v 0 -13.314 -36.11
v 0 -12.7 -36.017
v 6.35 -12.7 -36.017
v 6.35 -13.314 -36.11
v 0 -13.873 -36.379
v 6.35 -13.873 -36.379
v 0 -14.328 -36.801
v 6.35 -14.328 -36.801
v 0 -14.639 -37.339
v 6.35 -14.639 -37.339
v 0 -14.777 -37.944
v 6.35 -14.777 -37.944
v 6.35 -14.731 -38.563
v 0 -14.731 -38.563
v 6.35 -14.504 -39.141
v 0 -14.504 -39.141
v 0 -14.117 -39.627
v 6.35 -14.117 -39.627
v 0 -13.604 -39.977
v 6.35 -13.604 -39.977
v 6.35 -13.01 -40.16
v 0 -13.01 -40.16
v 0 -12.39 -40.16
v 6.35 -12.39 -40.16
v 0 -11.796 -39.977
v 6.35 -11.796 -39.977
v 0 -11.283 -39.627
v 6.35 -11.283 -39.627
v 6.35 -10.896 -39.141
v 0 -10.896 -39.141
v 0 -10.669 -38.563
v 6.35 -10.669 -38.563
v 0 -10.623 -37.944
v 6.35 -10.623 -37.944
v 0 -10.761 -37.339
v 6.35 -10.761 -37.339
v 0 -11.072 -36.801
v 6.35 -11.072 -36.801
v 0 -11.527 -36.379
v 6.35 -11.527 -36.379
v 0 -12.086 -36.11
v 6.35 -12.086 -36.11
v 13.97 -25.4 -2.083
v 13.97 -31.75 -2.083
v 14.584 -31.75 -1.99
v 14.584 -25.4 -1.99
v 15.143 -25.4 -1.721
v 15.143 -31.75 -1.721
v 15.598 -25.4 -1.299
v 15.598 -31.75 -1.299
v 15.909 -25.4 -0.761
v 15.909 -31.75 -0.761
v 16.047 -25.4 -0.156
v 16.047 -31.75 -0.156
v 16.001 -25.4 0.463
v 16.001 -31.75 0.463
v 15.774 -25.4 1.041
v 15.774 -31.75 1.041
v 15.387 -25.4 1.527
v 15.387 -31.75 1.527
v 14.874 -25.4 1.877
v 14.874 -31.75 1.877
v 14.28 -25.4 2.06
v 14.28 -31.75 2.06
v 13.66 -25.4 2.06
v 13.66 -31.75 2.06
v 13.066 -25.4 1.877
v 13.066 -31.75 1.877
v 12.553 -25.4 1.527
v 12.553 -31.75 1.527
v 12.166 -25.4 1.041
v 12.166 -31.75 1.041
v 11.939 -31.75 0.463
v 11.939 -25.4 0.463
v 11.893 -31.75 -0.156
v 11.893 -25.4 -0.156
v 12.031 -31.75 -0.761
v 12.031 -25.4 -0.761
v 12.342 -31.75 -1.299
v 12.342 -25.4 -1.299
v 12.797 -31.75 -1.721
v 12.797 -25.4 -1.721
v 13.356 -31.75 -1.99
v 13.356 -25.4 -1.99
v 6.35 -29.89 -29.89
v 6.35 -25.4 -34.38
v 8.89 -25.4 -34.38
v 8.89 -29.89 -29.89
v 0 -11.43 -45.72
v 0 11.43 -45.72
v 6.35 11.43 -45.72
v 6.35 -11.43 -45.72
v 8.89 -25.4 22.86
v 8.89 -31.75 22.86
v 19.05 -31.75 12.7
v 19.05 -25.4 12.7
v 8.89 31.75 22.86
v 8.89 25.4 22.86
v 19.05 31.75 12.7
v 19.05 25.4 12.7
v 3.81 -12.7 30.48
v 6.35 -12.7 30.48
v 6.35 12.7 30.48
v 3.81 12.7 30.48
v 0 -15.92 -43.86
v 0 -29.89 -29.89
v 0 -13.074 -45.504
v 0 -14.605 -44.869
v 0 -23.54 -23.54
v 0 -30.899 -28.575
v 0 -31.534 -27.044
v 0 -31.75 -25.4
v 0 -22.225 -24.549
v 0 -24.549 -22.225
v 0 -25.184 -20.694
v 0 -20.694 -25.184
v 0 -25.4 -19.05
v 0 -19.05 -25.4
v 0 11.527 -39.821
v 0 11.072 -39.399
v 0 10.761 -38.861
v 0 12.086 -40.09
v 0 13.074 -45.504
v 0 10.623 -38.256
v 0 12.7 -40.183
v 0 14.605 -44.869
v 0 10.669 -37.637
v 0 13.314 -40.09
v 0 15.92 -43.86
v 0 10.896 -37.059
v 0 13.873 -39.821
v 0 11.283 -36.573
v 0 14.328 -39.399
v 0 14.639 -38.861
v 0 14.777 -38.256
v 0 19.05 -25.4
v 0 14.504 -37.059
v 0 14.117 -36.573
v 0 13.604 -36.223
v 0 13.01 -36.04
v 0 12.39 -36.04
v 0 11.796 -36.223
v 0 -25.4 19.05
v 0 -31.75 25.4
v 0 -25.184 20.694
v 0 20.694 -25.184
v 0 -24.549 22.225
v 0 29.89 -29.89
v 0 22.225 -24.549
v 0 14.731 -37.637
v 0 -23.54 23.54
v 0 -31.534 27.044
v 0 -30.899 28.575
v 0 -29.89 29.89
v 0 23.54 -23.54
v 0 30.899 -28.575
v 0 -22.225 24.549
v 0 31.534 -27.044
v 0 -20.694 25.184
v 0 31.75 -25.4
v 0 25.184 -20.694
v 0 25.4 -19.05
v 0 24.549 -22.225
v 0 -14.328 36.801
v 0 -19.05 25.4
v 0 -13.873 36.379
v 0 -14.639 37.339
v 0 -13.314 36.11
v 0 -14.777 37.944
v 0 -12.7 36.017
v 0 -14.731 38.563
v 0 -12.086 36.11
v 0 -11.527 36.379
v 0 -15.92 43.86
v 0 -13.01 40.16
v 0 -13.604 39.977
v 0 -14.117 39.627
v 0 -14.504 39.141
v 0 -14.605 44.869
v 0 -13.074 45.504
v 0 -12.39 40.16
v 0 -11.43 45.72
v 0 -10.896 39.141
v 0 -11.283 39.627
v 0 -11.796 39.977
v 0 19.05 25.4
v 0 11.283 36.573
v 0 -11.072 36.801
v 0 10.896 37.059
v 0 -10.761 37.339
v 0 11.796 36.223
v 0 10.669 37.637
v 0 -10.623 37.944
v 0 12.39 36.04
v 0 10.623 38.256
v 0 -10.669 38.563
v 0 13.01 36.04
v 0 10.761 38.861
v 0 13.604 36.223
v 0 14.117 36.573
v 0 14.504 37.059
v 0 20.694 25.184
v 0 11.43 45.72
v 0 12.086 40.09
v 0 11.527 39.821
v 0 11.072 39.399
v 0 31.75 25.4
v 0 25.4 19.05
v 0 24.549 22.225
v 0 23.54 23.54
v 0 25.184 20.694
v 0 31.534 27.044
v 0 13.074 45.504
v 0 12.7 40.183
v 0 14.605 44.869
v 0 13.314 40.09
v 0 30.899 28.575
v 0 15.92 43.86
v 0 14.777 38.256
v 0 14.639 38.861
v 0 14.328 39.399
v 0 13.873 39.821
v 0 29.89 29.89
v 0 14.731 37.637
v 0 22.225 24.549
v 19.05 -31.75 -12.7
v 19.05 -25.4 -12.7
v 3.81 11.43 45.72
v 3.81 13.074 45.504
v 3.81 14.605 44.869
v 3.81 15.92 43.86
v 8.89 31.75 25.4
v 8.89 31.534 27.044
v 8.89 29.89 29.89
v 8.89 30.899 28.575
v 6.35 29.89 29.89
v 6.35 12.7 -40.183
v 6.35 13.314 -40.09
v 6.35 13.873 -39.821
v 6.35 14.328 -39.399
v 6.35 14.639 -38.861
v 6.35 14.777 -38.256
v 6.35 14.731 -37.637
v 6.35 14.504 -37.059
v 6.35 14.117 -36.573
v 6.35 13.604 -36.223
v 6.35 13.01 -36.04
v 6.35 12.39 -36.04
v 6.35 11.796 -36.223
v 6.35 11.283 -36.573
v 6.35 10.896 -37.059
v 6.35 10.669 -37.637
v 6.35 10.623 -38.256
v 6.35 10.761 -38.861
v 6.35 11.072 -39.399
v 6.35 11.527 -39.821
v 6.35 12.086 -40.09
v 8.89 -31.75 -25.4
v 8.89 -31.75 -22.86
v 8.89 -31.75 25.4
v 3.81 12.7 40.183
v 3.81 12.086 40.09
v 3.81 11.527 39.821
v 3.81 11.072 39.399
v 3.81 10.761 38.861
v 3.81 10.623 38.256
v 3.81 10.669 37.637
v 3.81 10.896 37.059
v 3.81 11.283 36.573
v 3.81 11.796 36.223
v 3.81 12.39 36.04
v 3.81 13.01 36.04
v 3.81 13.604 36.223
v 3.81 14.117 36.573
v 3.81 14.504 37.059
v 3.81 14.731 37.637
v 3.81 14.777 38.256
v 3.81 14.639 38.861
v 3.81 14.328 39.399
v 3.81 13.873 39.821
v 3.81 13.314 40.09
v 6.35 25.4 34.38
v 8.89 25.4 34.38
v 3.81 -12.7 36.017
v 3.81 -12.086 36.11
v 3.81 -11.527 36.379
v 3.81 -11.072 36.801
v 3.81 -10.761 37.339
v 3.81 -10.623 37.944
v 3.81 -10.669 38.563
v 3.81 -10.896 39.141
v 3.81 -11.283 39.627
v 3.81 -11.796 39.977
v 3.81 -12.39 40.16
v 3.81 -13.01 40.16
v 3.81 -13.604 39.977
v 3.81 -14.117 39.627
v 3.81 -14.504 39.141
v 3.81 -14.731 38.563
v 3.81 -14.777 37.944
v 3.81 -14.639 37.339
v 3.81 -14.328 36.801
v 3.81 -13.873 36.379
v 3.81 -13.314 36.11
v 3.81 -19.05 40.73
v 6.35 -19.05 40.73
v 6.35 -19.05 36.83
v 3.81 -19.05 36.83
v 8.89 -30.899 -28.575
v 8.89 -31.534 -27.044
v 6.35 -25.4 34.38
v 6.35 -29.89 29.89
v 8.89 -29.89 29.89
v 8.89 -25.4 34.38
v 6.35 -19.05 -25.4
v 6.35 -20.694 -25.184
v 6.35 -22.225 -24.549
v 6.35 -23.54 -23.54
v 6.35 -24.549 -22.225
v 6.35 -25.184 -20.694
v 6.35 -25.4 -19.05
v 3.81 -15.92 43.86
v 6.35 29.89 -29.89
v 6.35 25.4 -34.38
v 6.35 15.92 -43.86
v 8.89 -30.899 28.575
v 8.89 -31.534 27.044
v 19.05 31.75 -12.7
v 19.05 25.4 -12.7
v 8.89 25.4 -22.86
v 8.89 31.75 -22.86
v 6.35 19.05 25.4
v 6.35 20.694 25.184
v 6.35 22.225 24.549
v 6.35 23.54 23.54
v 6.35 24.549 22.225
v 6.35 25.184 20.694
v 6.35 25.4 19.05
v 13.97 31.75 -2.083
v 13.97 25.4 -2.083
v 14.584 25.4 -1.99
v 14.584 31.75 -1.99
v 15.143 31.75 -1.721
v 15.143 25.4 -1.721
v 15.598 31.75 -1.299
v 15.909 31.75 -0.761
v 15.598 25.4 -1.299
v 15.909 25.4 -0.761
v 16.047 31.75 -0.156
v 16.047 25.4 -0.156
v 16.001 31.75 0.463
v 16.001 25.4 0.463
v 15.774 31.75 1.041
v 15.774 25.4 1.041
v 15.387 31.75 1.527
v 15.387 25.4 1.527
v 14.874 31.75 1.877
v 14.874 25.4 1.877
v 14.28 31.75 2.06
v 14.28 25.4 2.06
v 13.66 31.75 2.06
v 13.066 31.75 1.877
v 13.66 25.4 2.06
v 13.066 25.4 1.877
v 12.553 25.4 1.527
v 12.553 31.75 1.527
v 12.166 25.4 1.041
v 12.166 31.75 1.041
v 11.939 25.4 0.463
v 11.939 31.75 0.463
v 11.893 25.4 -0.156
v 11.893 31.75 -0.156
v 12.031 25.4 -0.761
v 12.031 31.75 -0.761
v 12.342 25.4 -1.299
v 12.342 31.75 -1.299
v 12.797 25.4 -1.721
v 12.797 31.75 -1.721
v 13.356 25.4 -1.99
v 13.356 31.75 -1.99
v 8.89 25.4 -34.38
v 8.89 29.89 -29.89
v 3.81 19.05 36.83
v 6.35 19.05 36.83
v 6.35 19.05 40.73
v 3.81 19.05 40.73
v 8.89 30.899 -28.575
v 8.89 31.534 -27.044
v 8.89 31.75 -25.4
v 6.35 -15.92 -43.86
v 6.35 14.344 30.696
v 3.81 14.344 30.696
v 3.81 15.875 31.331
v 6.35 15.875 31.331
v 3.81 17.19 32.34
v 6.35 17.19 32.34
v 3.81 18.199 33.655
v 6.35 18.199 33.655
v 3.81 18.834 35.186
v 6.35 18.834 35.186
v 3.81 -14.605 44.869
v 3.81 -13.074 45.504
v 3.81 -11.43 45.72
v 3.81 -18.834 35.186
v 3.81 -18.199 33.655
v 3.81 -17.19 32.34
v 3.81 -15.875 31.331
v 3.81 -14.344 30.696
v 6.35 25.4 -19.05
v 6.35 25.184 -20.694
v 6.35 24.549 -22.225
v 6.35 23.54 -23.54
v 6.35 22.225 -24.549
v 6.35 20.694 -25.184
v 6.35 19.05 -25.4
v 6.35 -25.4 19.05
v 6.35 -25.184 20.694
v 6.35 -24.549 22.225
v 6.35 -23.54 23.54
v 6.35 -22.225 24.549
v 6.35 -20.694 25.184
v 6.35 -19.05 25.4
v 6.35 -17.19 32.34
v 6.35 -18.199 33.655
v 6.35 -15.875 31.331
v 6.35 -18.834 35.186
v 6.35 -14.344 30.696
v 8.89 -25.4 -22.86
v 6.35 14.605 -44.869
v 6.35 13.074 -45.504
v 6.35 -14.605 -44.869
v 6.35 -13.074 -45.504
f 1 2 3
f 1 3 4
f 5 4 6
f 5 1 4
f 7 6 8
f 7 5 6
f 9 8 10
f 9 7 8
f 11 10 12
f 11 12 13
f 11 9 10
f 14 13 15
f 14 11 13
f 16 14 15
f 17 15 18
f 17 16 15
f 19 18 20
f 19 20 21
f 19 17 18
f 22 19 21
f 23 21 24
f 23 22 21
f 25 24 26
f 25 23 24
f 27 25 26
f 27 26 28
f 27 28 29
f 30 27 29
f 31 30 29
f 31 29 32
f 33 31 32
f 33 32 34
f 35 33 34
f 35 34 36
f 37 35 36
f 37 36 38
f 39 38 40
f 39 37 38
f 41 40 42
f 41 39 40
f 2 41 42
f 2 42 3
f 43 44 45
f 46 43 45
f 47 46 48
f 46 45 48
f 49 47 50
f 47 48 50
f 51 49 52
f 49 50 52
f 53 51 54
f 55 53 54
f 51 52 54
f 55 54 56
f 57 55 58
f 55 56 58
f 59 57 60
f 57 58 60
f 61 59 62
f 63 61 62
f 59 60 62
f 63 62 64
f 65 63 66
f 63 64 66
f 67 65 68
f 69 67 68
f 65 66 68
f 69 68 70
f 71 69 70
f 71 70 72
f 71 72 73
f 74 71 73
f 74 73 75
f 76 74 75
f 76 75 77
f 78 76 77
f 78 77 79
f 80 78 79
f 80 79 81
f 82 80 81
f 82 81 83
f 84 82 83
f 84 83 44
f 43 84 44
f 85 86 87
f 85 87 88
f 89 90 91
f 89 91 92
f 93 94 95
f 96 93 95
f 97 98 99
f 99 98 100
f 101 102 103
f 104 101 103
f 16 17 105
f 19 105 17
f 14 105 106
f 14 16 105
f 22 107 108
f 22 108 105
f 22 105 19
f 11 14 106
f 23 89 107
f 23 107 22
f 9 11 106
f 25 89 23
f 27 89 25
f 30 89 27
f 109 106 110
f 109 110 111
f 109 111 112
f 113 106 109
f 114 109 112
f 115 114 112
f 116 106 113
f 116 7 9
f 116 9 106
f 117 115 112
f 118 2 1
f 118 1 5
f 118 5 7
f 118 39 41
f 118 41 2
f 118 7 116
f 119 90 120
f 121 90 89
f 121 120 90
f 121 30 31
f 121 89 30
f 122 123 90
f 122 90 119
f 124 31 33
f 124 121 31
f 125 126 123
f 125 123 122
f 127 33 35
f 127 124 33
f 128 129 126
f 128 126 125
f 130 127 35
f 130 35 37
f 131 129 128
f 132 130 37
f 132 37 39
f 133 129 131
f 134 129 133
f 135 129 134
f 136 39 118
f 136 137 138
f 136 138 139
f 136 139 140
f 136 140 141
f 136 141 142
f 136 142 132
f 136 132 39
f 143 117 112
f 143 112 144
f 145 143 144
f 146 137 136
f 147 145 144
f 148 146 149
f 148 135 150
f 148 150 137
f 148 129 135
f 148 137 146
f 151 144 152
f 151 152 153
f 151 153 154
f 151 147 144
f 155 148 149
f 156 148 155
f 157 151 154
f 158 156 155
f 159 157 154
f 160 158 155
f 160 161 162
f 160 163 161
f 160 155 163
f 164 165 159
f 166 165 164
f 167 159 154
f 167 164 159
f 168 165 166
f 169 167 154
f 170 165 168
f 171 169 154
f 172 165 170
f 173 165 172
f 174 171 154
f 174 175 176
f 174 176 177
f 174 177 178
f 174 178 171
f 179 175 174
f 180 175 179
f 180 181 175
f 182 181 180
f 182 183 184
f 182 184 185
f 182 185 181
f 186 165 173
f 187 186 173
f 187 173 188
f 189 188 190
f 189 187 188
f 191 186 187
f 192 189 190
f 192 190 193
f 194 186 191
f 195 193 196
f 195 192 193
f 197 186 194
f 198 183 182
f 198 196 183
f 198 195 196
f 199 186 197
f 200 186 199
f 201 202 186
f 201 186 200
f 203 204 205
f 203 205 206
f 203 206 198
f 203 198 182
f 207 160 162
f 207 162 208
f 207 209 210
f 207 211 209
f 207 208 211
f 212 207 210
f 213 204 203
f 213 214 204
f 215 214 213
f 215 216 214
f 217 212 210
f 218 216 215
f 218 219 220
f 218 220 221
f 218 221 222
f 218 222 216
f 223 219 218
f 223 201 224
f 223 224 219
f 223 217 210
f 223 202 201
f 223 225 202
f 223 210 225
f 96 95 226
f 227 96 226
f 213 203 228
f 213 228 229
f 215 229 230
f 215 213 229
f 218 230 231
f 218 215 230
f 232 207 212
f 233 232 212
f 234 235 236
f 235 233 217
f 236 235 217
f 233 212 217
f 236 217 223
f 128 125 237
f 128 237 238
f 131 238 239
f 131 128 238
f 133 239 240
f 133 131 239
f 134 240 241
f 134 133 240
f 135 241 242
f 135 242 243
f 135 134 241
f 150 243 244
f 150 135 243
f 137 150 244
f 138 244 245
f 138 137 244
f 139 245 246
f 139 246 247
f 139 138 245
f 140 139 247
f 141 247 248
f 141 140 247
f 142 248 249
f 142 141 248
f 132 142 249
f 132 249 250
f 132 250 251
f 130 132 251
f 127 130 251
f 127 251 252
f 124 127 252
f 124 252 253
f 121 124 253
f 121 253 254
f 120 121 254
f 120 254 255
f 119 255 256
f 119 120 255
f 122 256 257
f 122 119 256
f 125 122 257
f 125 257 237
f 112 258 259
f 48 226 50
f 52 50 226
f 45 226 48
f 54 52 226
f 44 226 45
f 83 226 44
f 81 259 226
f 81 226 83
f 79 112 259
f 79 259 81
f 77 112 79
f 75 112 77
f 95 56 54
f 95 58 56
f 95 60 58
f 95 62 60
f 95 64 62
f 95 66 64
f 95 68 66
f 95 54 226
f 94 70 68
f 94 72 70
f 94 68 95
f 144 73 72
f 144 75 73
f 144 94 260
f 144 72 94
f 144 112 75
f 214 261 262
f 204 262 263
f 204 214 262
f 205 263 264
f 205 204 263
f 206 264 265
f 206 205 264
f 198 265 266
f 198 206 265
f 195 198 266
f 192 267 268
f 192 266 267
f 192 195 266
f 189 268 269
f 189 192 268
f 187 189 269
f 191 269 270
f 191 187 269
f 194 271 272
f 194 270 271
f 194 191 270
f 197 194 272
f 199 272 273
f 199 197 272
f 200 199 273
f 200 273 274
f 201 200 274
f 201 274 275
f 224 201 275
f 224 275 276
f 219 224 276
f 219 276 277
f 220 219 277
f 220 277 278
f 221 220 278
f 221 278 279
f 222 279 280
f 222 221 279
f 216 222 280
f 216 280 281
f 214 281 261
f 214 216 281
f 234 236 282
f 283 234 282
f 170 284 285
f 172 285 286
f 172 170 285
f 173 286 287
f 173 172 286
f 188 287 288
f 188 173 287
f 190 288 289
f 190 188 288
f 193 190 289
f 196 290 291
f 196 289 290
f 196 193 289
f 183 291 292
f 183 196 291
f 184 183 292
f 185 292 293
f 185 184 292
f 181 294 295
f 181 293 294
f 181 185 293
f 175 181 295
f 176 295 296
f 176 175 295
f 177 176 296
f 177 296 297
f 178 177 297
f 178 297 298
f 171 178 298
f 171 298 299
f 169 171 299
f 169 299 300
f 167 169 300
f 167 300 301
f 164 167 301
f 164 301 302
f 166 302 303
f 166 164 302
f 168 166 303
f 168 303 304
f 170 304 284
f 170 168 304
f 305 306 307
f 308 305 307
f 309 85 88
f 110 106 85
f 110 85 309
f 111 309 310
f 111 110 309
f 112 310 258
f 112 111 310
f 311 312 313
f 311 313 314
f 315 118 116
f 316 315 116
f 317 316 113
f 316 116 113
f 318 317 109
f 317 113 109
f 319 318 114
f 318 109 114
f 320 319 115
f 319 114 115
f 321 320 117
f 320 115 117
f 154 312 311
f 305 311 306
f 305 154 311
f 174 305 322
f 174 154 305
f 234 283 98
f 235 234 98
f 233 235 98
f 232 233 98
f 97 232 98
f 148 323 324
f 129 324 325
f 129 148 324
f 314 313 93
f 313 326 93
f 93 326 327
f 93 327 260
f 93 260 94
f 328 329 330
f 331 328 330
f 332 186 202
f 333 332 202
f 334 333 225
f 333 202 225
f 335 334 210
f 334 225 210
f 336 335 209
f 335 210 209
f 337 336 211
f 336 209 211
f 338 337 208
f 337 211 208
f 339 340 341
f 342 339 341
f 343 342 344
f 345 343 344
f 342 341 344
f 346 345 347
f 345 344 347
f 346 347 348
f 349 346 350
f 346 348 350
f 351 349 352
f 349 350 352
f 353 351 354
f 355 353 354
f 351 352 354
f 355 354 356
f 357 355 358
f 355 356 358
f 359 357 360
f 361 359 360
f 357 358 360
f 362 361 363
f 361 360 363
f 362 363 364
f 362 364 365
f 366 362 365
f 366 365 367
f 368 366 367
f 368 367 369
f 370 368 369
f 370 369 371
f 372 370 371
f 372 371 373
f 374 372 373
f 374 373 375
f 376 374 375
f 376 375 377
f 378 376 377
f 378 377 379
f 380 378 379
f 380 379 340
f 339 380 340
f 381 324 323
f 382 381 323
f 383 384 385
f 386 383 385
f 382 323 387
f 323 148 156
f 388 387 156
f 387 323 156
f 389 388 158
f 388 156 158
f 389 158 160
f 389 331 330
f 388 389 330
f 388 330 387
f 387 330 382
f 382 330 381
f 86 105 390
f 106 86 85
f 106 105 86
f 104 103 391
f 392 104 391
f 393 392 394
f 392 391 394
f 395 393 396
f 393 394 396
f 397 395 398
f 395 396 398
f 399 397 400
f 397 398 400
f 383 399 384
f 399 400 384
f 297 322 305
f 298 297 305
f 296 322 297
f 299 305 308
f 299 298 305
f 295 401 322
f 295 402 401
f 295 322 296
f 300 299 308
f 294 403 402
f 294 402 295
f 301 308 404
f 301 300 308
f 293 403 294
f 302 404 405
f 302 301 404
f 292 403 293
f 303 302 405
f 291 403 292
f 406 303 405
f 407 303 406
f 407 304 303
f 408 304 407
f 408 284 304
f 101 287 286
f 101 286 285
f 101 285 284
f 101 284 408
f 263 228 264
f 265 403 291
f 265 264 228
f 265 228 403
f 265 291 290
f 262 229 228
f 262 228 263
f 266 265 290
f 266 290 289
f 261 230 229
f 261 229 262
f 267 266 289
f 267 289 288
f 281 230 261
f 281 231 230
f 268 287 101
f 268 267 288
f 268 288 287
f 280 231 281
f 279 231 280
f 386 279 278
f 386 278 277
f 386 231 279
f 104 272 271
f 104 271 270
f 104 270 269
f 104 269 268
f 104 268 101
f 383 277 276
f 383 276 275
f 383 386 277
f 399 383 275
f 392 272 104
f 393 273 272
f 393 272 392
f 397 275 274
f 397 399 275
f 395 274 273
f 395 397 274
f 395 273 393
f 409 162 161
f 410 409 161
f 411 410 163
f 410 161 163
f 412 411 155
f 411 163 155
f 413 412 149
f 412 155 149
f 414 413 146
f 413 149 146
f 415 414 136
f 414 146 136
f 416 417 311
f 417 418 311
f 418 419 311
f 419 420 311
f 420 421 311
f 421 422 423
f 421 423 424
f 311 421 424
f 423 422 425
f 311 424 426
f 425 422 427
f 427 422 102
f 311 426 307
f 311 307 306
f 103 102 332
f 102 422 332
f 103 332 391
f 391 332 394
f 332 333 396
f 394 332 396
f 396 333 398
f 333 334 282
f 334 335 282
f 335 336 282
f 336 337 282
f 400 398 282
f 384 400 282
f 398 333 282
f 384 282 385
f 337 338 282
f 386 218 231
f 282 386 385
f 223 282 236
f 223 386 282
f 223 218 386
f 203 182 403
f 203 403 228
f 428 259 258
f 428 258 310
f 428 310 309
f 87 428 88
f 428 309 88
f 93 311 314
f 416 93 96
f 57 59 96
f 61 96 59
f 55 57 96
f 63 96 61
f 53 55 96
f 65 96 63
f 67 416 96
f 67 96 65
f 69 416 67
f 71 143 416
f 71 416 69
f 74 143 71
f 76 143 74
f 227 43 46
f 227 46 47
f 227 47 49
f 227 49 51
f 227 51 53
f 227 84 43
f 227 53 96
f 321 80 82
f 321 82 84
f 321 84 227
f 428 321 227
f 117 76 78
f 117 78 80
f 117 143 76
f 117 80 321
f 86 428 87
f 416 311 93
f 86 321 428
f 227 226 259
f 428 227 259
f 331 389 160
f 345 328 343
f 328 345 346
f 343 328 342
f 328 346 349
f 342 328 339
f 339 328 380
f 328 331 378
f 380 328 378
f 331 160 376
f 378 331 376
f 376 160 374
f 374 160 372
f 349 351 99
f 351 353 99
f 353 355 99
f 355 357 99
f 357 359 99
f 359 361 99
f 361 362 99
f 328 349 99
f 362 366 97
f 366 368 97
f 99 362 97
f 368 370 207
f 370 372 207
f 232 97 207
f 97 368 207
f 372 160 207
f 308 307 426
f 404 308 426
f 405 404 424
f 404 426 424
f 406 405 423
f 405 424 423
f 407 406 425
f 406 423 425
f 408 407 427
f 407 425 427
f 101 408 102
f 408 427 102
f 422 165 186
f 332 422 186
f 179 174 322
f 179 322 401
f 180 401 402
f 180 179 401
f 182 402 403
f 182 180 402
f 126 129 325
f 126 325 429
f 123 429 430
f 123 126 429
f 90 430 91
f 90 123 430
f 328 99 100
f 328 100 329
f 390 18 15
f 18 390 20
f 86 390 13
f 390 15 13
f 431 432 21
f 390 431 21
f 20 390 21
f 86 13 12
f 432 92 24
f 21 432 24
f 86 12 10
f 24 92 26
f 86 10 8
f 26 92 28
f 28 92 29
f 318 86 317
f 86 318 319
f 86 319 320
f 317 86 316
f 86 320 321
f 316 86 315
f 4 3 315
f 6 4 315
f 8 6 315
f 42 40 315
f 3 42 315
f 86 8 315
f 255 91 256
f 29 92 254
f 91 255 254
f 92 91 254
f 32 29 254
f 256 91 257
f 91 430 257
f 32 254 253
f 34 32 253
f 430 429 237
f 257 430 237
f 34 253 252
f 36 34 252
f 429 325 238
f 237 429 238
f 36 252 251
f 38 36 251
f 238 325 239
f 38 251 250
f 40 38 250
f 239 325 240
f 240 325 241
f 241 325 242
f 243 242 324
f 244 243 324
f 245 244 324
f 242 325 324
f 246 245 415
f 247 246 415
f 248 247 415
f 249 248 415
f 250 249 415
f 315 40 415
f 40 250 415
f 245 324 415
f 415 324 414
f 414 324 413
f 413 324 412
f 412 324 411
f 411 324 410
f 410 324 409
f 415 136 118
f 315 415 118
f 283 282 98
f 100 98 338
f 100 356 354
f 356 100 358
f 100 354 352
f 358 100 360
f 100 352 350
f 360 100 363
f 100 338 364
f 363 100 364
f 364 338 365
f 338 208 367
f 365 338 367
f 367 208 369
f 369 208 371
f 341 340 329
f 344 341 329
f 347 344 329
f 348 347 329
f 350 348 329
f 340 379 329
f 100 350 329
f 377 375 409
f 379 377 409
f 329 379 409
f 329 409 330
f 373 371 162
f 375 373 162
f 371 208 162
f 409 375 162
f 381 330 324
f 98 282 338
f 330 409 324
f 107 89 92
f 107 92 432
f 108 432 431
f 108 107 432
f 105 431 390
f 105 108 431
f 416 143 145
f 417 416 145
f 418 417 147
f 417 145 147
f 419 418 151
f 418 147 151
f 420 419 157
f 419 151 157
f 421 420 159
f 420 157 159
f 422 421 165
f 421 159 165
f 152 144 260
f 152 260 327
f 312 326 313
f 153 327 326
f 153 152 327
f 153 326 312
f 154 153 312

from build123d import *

# Parameters (mm, degrees)
SKETCH1_R           = 2.0828
BOSS_EXTRUDE1_DEPTH = 6.35
BOSS_EXTRUDE2_DEPTH = 12.7
SKETCH3_W           = 10.16
SKETCH3_H           = 8.980256121
SKETCH3_R           = 2.0828
CUT_EXTRUDE2_DEPTH  = 81.532421421
CUT_EXTRUDE3_DEPTH  = 2.54


with BuildPart() as part:
    # Sketch1 → Boss-Extrude1 (new body)
    with BuildSketch(Plane(origin=(0, 0, 0), x_dir=(0, 0, -1), z_dir=(1, 0, 0))):
        with BuildLine():
            Line((-25.4, 31.75), (25.4, 31.75))
            ThreePointArc((25.4, 31.75), (27.830039796, 31.266635031), (29.890128061, 29.890128061))
            Line((29.890128061, 29.890128061), (43.860128061, 15.920128061))
            ThreePointArc((43.860128061, 15.920128061), (45.236635031, 13.860039796), (45.72, 11.43))
            Line((45.72, 11.43), (45.72, -11.43))
            ThreePointArc((45.72, -11.43), (45.236635031, -13.860039796), (43.860128061, -15.920128061))
            Line((43.860128061, -15.920128061), (29.890128061, -29.890128061))
            ThreePointArc((29.890128061, -29.890128061), (27.830039796, -31.266635031), (25.4, -31.75))
            Line((25.4, -31.75), (-25.4, -31.75))
            ThreePointArc((-25.4, -31.75), (-27.830039796, -31.266635031), (-29.890128061, -29.890128061))
            Line((-29.890128061, -29.890128061), (-43.860128061, -15.920128061))
            ThreePointArc((-43.860128061, -15.920128061), (-45.236635031, -13.860039796), (-45.72, -11.43))
            Line((-45.72, -11.43), (-45.72, 11.43))
            ThreePointArc((-45.72, 11.43), (-45.236635031, 13.860039796), (-43.860128061, 15.920128061))
            Line((-43.860128061, 15.920128061), (-29.890128061, 29.890128061))
            ThreePointArc((-29.890128061, 29.890128061), (-27.830039796, 31.266635031), (-25.4, 31.75))
        make_face()
        with Locations((38.1, 12.7)):
            Circle(SKETCH1_R, mode=Mode.SUBTRACT)
        with Locations(Location((38.1, -12.7, 0), (0, 0, 180))):
            Circle(SKETCH1_R, mode=Mode.SUBTRACT)
        with Locations((-38.1, -12.7)):
            Circle(SKETCH1_R, mode=Mode.SUBTRACT)
        with Locations(Location((-38.1, 12.7, 0), (0, 0, 180))):
            Circle(SKETCH1_R, mode=Mode.SUBTRACT)
        with BuildLine():
            Line((-19.05, 25.4), (19.05, 25.4))
            ThreePointArc((19.05, 25.4), (23.540128061, 23.540128061), (25.4, 19.05))
            Line((25.4, 19.05), (25.4, -19.05))
            ThreePointArc((25.4, -19.05), (23.540128061, -23.540128061), (19.05, -25.4))
            Line((19.05, -25.4), (-19.05, -25.4))
            ThreePointArc((-19.05, -25.4), (-23.540128061, -23.540128061), (-25.4, -19.05))
            Line((-25.4, -19.05), (-25.4, 19.05))
            ThreePointArc((-25.4, 19.05), (-23.540128061, 23.540128061), (-19.05, 25.4))
        make_face(mode=Mode.SUBTRACT)
    extrude(amount=BOSS_EXTRUDE1_DEPTH)

    # Sketch2 → Boss-Extrude2 (add)
    with BuildSketch(Plane(origin=(6.35, 0, 0), x_dir=(0, 0, -1), z_dir=(1, 0, 0))):
        with BuildLine():
            Line((25.4, 31.75), (-25.4, 31.75))
            ThreePointArc((-25.4, 31.75), (-27.830039796, 31.266635031), (-29.890128061, 29.890128061))
            Line((-29.890128061, 29.890128061), (-34.380256121, 25.4))
            Line((-34.380256121, 25.4), (-19.05, 25.4))
            Line((-19.05, 25.4), (19.05, 25.4))
            Line((19.05, 25.4), (34.380256121, 25.4))
            Line((34.380256121, 25.4), (29.890128061, 29.890128061))
            ThreePointArc((29.890128061, 29.890128061), (27.830039796, 31.266635031), (25.4, 31.75))
        make_face()
    boss_extrude2 = extrude(amount=BOSS_EXTRUDE2_DEPTH)

    # Mirror1: Boss-Extrude2 across plane
    add(boss_extrude2.mirror(Plane.ZX))

    # Sketch3 → Cut-Extrude2 (cut, through all)
    with BuildSketch(Plane.XZ.offset(31.75)):
        with Locations((13.97, 29.890128061)):
            Rectangle(SKETCH3_W, SKETCH3_H)
        Polygon((8.89, 22.86), (19.05, 12.7), (19.05, 25.4), (8.89, 25.4), align=None)
        with Locations((13.97, -29.890128061)):
            Rectangle(SKETCH3_W, SKETCH3_H)
        Polygon((8.89, -25.4), (19.05, -25.4), (19.05, -12.7), (8.89, -22.86), align=None)
        with Locations(Location((13.97, 0, 0), (0, 0, 270))):
            Circle(SKETCH3_R)
    extrude(amount=-CUT_EXTRUDE2_DEPTH, mode=Mode.SUBTRACT)

    # Sketch5 → Cut-Extrude3 (cut)
    with BuildSketch(Plane(origin=(6.35, 0, 0), x_dir=(0, 0, -1), z_dir=(1, 0, 0))):
        with BuildLine():
            Line((-36.83, 19.05), (-45.72, 19.05))
            Line((-45.72, 19.05), (-45.72, -19.05))
            Line((-45.72, -19.05), (-36.83, -19.05))
            ThreePointArc((-36.83, -19.05), (-32.339871939, -17.190128061), (-30.48, -12.7))
            Line((-30.48, -12.7), (-30.48, 12.7))
            ThreePointArc((-30.48, 12.7), (-32.339871939, 17.190128061), (-36.83, 19.05))
        make_face()
    extrude(amount=-CUT_EXTRUDE3_DEPTH, mode=Mode.SUBTRACT)


solid = part.part
